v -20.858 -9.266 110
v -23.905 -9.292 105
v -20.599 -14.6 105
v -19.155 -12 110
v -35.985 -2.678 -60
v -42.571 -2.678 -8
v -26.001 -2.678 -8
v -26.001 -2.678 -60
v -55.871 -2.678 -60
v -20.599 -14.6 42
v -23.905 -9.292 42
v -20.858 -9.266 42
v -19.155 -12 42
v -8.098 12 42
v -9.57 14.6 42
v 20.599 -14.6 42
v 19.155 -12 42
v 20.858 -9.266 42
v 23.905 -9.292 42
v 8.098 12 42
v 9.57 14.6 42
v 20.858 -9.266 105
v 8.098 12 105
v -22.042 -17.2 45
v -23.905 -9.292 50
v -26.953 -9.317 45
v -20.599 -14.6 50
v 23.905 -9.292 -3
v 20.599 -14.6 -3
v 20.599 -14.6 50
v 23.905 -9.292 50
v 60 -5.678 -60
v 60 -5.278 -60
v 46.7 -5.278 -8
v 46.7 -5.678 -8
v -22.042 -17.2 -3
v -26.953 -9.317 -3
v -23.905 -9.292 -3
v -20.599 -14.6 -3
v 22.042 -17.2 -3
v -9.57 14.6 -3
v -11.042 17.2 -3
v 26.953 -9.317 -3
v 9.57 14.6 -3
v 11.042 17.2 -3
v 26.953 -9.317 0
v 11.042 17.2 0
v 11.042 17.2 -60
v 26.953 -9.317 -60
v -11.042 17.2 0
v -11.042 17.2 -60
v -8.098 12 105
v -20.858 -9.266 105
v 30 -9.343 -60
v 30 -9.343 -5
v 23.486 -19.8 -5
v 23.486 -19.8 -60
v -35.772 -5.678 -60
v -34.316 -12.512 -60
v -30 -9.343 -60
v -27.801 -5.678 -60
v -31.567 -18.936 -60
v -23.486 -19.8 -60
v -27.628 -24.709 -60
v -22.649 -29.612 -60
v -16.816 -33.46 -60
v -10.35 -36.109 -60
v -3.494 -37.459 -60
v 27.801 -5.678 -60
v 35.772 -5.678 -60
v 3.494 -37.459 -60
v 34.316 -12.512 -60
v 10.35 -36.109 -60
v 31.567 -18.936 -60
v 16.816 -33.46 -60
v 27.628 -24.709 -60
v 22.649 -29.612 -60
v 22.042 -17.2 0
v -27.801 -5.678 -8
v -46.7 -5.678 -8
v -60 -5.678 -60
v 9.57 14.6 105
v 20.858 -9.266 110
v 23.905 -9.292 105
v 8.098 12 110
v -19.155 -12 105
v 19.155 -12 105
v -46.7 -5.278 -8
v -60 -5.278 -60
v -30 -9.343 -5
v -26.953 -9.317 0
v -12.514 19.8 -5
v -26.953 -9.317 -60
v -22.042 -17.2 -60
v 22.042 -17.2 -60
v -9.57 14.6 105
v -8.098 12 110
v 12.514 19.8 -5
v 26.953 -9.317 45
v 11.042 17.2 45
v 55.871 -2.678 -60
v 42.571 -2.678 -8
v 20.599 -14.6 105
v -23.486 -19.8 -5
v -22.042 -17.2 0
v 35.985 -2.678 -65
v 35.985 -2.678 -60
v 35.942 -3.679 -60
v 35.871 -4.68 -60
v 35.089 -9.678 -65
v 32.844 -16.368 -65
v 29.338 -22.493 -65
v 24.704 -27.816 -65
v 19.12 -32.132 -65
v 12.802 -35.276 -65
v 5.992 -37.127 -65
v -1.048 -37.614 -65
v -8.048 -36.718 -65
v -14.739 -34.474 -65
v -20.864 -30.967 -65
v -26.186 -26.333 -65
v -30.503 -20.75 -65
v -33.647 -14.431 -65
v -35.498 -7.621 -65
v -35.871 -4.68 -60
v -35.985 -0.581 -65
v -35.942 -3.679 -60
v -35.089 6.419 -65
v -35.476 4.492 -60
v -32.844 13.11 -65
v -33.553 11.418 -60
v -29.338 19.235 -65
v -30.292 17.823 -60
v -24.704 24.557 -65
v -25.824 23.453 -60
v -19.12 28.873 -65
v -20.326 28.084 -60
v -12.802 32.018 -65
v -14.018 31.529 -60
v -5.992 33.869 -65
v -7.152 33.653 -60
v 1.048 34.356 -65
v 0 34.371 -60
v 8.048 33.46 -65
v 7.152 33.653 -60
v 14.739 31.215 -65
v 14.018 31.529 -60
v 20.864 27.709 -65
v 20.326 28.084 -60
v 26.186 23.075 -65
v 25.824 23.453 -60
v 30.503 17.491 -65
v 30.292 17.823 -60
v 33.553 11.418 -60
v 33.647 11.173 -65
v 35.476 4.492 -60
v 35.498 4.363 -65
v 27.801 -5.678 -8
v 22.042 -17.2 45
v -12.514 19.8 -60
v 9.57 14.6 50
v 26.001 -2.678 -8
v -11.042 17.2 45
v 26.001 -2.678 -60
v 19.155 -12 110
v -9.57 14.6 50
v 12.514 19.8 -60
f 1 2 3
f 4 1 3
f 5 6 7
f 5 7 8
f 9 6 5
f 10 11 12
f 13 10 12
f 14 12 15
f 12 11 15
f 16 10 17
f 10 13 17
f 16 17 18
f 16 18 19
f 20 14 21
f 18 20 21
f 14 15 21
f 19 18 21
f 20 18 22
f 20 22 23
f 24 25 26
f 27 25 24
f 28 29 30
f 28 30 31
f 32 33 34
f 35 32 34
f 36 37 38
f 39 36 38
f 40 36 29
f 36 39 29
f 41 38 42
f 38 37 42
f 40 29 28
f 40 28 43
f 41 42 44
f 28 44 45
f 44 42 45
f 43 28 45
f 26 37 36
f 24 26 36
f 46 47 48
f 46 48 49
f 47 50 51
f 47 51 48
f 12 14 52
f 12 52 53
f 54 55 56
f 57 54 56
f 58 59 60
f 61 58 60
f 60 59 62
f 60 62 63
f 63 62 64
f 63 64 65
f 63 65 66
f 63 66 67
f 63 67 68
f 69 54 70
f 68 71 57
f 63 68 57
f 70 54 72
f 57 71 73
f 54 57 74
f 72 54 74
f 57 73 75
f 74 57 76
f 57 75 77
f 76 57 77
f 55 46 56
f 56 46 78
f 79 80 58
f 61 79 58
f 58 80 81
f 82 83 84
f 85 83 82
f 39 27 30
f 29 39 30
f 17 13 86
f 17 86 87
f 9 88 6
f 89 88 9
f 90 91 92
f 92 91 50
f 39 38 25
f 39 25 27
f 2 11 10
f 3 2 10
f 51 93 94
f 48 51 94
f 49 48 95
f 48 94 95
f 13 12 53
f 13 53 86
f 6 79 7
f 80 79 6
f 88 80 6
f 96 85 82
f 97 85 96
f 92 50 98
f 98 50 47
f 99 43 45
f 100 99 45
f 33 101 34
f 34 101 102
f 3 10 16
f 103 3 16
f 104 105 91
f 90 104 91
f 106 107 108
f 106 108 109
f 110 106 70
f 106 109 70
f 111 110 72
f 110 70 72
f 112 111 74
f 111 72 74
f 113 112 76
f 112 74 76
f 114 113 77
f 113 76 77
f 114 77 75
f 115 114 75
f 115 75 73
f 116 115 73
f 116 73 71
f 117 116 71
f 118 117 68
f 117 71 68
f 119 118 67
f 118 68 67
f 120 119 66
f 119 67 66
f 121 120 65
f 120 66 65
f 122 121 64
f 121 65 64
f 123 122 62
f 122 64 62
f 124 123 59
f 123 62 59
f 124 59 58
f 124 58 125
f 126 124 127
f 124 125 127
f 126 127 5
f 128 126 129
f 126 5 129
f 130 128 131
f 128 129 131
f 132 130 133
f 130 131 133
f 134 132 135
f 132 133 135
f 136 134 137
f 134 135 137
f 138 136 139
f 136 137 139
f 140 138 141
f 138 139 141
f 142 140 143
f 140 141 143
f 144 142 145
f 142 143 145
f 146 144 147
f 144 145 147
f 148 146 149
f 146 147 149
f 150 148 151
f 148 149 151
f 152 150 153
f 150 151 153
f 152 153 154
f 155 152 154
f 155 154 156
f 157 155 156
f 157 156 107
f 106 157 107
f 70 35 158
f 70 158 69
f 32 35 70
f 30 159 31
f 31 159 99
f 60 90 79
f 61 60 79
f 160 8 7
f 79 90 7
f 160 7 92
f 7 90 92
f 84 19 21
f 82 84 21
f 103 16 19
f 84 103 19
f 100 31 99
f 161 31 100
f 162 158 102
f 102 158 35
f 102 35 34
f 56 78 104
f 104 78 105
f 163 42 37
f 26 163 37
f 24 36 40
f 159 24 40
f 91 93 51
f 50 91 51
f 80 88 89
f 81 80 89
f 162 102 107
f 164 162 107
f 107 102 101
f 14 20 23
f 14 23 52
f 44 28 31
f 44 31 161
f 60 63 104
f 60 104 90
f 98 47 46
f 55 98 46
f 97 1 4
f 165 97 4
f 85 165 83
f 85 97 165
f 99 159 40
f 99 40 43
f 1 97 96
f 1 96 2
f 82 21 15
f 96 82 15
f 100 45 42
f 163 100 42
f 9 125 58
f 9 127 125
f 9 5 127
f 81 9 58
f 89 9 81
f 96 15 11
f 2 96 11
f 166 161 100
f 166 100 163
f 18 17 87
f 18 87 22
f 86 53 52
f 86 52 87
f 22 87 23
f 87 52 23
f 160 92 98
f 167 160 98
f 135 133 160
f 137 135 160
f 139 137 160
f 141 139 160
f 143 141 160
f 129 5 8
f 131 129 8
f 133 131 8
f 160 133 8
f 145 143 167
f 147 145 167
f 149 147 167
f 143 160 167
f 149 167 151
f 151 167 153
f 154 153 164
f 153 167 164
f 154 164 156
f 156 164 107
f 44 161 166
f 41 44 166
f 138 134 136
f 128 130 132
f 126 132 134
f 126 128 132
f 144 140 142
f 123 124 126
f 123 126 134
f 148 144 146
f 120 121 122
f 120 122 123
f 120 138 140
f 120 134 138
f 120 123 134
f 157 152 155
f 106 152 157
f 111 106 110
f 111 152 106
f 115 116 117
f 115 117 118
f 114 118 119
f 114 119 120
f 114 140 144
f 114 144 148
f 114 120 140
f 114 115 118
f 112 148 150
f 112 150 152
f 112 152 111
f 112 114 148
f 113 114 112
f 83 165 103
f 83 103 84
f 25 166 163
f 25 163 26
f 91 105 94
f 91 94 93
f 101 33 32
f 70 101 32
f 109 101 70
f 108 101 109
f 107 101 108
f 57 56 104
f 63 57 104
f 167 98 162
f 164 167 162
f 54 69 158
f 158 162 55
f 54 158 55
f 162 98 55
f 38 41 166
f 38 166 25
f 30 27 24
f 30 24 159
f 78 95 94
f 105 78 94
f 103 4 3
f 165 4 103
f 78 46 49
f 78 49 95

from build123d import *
from OCP.BRepFilletAPI import BRepFilletAPI_MakeChamfer

# Parameters (mm, degrees)
BOSS_EXTRUDE1_DEPTH      = 60
BOSS_EXTRUDE2_DEPTH      = 50
BOSS_EXTRUDE2_DEPTH_BACK = 3
CHAMFER1_SIZE            = 5
CHAMFER1_SIZE_2          = 2.6
BOSS_EXTRUDE3_DEPTH      = 60
BOSS_EXTRUDE3_DEPTH_BACK = 8
CHAMFER2_SIZE            = 2.6
CHAMFER2_SIZE_2          = 5
BOSS_EXTRUDE4_REACH      = 145.499
SKETCH9_W                = 52
SKETCH9_H                = 3
CUT_EXTRUDE1_DEPTH       = 28
CHAMFER3_SIZE            = 2.6
CHAMFER3_SIZE_2          = 5
BOSS_EXTRUDE5_DEPTH      = 5
BOSS_EXTRUDE6_REACH      = 165.988
SKETCH13_W               = 52
SKETCH13_H               = 3
CUT_EXTRUDE2_DEPTH       = 5
CHAMFER4_SIZE            = 4
CHAMFER4_SIZE2           = 2.6
CHAMFER5_SIZE            = 2.6
CHAMFER5_SIZE2           = 4
SKETCH16_R               = 36
BOSS_EXTRUDE7_DEPTH      = 5


with BuildPart() as part:
    # Sketch1 → Boss-Extrude1 (new body)
    with BuildSketch(Plane.XY):
        Polygon((23.485714286, -19.8), (-23.485714286, -19.8), (-30, -9.342857143), (-12.514285714, 19.8), (12.514285714, 19.8), (30, -9.342857143), align=None)
        Polygon((-26.95263288, -9.317403585), (-11.042190729, 17.2), (11.042190729, 17.2), (26.95263288, -9.317403585), (22.042162982, -17.2), (-22.042162982, -17.2), align=None, mode=Mode.SUBTRACT)
    extrude(amount=-BOSS_EXTRUDE1_DEPTH)

    # Chamfer1
    chamfer1_edges_1 = [part.edges().sort_by_distance(p)[0] for p in [
        (26.742857143, -14.571428571, 0),
    ]]
    chamfer1_side_1 = [part.faces().sort_by_distance(p)[0] for p in [
        (26.742857143, -14.571428571, -0.052),
    ]]
    chamfer1_edges_2 = [part.edges().sort_by_distance(p)[0] for p in [
        (0, -19.8, 0),
    ]]
    chamfer1_side_2 = [part.faces().sort_by_distance(p)[0] for p in [
        (0, -19.8, -0.052),
    ]]
    chamfer1_edges_3 = [part.edges().sort_by_distance(p)[0] for p in [
        (-26.742857143, -14.571428571, 0),
    ]]
    chamfer1_side_3 = [part.faces().sort_by_distance(p)[0] for p in [
        (-26.742857143, -14.571428571, -0.052),
    ]]
    chamfer1_edges_4 = [part.edges().sort_by_distance(p)[0] for p in [
        (-21.257142857, 5.228571429, 0),
    ]]
    chamfer1_side_4 = [part.faces().sort_by_distance(p)[0] for p in [
        (-21.257142857, 5.228571429, -0.052),
    ]]
    chamfer1_edges_5 = [part.edges().sort_by_distance(p)[0] for p in [
        (0, 19.8, 0),
    ]]
    chamfer1_side_5 = [part.faces().sort_by_distance(p)[0] for p in [
        (0, 19.8, -0.052),
    ]]
    chamfer1_edges_6 = [part.edges().sort_by_distance(p)[0] for p in [
        (21.257142857, 5.228571429, 0),
    ]]
    chamfer1_side_6 = [part.faces().sort_by_distance(p)[0] for p in [
        (21.257142857, 5.228571429, -0.052),
    ]]
    chamfer1 = BRepFilletAPI_MakeChamfer(part.part.solid().wrapped)
    for e in chamfer1_edges_1:
        chamfer1.Add(CHAMFER1_SIZE - 0.0001, CHAMFER1_SIZE_2 - 0.0001, e.wrapped, chamfer1_side_1[0].wrapped)
    for e in chamfer1_edges_2:
        chamfer1.Add(CHAMFER1_SIZE - 0.0001, CHAMFER1_SIZE_2 - 0.0001, e.wrapped, chamfer1_side_2[0].wrapped)
    for e in chamfer1_edges_3:
        chamfer1.Add(CHAMFER1_SIZE - 0.0001, CHAMFER1_SIZE_2 - 0.0001, e.wrapped, chamfer1_side_3[0].wrapped)
    for e in chamfer1_edges_4:
        chamfer1.Add(CHAMFER1_SIZE - 0.0001, CHAMFER1_SIZE_2 - 0.0001, e.wrapped, chamfer1_side_4[0].wrapped)
    for e in chamfer1_edges_5:
        chamfer1.Add(CHAMFER1_SIZE - 0.0001, CHAMFER1_SIZE_2 - 0.0001, e.wrapped, chamfer1_side_5[0].wrapped)
    for e in chamfer1_edges_6:
        chamfer1.Add(CHAMFER1_SIZE - 0.0001, CHAMFER1_SIZE_2 - 0.0001, e.wrapped, chamfer1_side_6[0].wrapped)
    add(Compound.cast(chamfer1.Shape()), mode=Mode.REPLACE)  # a hair under: the kernel refuses the full size

    # Boss-Extrude4: up to this plane
    boss_extrude4_end = Plane(origin=(12.514285714, 19.8, -60), z_dir=(0.8574929257125442, 0.5144957554275265, 0))
    # Sketch9 → Boss-Extrude4 (add, up to the surface)
    with BuildSketch(Plane(origin=(60, 0, 0), x_dir=(0, 0, -1), z_dir=(1, 0, 0)), mode=Mode.PRIVATE) as boss_extrude4_sk1:
        with Locations((34, -4.177515253)):
            Rectangle(SKETCH9_W, SKETCH9_H)
    boss_extrude4_tool1 = split(extrude(boss_extrude4_sk1.sketch, amount=-BOSS_EXTRUDE4_REACH, mode=Mode.PRIVATE), bisect_by=boss_extrude4_end, keep=Keep.BOTH, mode=Mode.PRIVATE)
    add(boss_extrude4_tool1.solids().sort_by_distance((60, -4.177515, -34))[0])

    # Sketch10 → Cut-Extrude1 (cut)
    with BuildSketch(Plane(origin=(0, -2.677515253, 0), x_dir=(1, 0, 0), z_dir=(0, 1, 0))):
        Polygon((60, 8), (60, 60), (46.7, 8), align=None)
    extrude(amount=-CUT_EXTRUDE1_DEPTH, mode=Mode.SUBTRACT)

    # Boss-Extrude6: up to this plane
    boss_extrude6_end = Plane(origin=(-30, -9.342857143, -60), z_dir=(-0.8574929257125442, 0.5144957554275265, 0))
    # Sketch13 → Boss-Extrude6 (add, up to the surface)
    with BuildSketch(Plane(origin=(-60, 0, 0), x_dir=(0, 0, -1), z_dir=(1, 0, 0)), mode=Mode.PRIVATE) as boss_extrude6_sk1:
        with Locations((34, -4.177515253)):
            Rectangle(SKETCH13_W, SKETCH13_H)
    boss_extrude6_tool1 = split(extrude(boss_extrude6_sk1.sketch, amount=BOSS_EXTRUDE6_REACH, mode=Mode.PRIVATE), bisect_by=boss_extrude6_end, keep=Keep.BOTH, mode=Mode.PRIVATE)
    add(boss_extrude6_tool1.solids().sort_by_distance((-60, -4.177515, -34))[0])

    # Sketch14 → Cut-Extrude2 (cut)
    with BuildSketch(Plane(origin=(0, -2.677515253, 0), x_dir=(1, 0, 0), z_dir=(0, 1, 0))):
        Polygon((-60, 60), (-60, 8), (-46.7, 8), align=None)
    extrude(amount=-CUT_EXTRUDE2_DEPTH, mode=Mode.SUBTRACT)

    # Chamfer4
    chamfer4_edges = [part.edges().sort_by_distance(p)[0] for p in [
        (-53.35, -2.677515253, -34),
    ]]
    chamfer4_side = [part.faces().sort_by_distance(p)[0] for p in [
        (-39.944890335, -2.677515253, -36.10731292),
    ]]
    chamfer(chamfer4_edges, length=CHAMFER4_SIZE, length2=CHAMFER4_SIZE2, reference=chamfer4_side[0])

    # Chamfer5
    chamfer5_edges = [part.edges().sort_by_distance(p)[0] for p in [
        (53.35, -2.677515253, -34),
    ]]
    chamfer5_side = [part.faces().sort_by_distance(p)[0] for p in [
        (53.35, -4.177515253, -34),
    ]]
    chamfer(chamfer5_edges, length=CHAMFER5_SIZE, length2=CHAMFER5_SIZE2, reference=chamfer5_side[0])

    # Sketch16 → Boss-Extrude7 (add)
    with BuildSketch(Plane(origin=(0, 0, -60), x_dir=(-1, 0, 0), z_dir=(0, 0, -1))):
        with Locations(Location((0, -1.629183352, 0), (0, 0, 181.66870794))):
            Circle(SKETCH16_R)
    extrude(amount=BOSS_EXTRUDE7_DEPTH)


with BuildPart() as body_2:
    # Sketch2 → Boss-Extrude2 (new, two sides: drawn at the far end of the back side and taken through both)
    with BuildSketch(Plane.XY.offset(-BOSS_EXTRUDE2_DEPTH_BACK)):
        Polygon((26.95263288, -9.317403585), (11.042190729, 17.2), (-11.042190729, 17.2), (-26.95263288, -9.317403585), (-22.042162982, -17.2), (22.042162982, -17.2), align=None)
        Polygon((23.90526576, -9.291950027), (9.570095744, 14.6), (-9.570095744, 14.6), (-23.90526576, -9.291950027), (-20.598611678, -14.6), (20.598611678, -14.6), align=None, mode=Mode.SUBTRACT)
    extrude(amount=BOSS_EXTRUDE2_DEPTH + BOSS_EXTRUDE2_DEPTH_BACK)

    # Chamfer2
    chamfer2_edges_1 = [body_2.edges().sort_by_distance(p)[0] for p in [
        (24.497397931, -13.258701792, 50),
    ]]
    chamfer2_side_1 = [body_2.faces().sort_by_distance(p)[0] for p in [
        (24.453261418, -13.231206916, 50),
    ]]
    chamfer2_edges_2 = [body_2.edges().sort_by_distance(p)[0] for p in [
        (18.997411804, 3.941298208, 50),
    ]]
    chamfer2_side_2 = [body_2.faces().sort_by_distance(p)[0] for p in [
        (18.997411804, 3.941298208, 49.948),
    ]]
    chamfer2_edges_3 = [body_2.edges().sort_by_distance(p)[0] for p in [
        (0, 17.2, 50),
    ]]
    chamfer2_side_3 = [body_2.faces().sort_by_distance(p)[0] for p in [
        (0, 17.2, 49.948),
    ]]
    chamfer2_edges_4 = [body_2.edges().sort_by_distance(p)[0] for p in [
        (-18.997411804, 3.941298208, 50),
    ]]
    chamfer2_side_4 = [body_2.faces().sort_by_distance(p)[0] for p in [
        (-18.997411804, 3.941298208, 49.948),
    ]]
    chamfer2_edges_5 = [body_2.edges().sort_by_distance(p)[0] for p in [
        (-24.497397931, -13.258701792, 50),
    ]]
    chamfer2_side_5 = [body_2.faces().sort_by_distance(p)[0] for p in [
        (-24.497397931, -13.258701792, 49.948),
    ]]
    chamfer2_edges_6 = [body_2.edges().sort_by_distance(p)[0] for p in [
        (0, -17.2, 50),
    ]]
    chamfer2_side_6 = [body_2.faces().sort_by_distance(p)[0] for p in [
        (0, -17.2, 49.948),
    ]]
    chamfer2 = BRepFilletAPI_MakeChamfer(body_2.part.solid().wrapped)
    for e in chamfer2_edges_1:
        chamfer2.Add(CHAMFER2_SIZE - 0.0001, CHAMFER2_SIZE_2 - 0.0001, e.wrapped, chamfer2_side_1[0].wrapped)
    for e in chamfer2_edges_2:
        chamfer2.Add(CHAMFER2_SIZE_2 - 0.0001, CHAMFER2_SIZE - 0.0001, e.wrapped, chamfer2_side_2[0].wrapped)
    for e in chamfer2_edges_3:
        chamfer2.Add(CHAMFER2_SIZE_2 - 0.0001, CHAMFER2_SIZE - 0.0001, e.wrapped, chamfer2_side_3[0].wrapped)
    for e in chamfer2_edges_4:
        chamfer2.Add(CHAMFER2_SIZE_2 - 0.0001, CHAMFER2_SIZE - 0.0001, e.wrapped, chamfer2_side_4[0].wrapped)
    for e in chamfer2_edges_5:
        chamfer2.Add(CHAMFER2_SIZE_2 - 0.0001, CHAMFER2_SIZE - 0.0001, e.wrapped, chamfer2_side_5[0].wrapped)
    for e in chamfer2_edges_6:
        chamfer2.Add(CHAMFER2_SIZE_2 - 0.0001, CHAMFER2_SIZE - 0.0001, e.wrapped, chamfer2_side_6[0].wrapped)
    add(Compound.cast(chamfer2.Shape()), mode=Mode.REPLACE)  # a hair under: the kernel refuses the full size


with BuildPart() as body_3:
    # Sketch8 → Boss-Extrude3 (new, two sides: drawn at the far end of the back side and taken through both)
    with BuildSketch(Plane.XY.offset(50).offset(-BOSS_EXTRUDE3_DEPTH_BACK)):
        Polygon((23.90526576, -9.291950027), (9.570095744, 14.6), (-9.570095744, 14.6), (-23.90526576, -9.291950027), (-20.598611678, -14.6), (20.598611678, -14.6), align=None)
        Polygon((19.155060374, -12), (20.85789864, -9.266496469), (8.098000758, 12), (-8.098000758, 12), (-20.85789864, -9.266496469), (-19.155060374, -12), align=None, mode=Mode.SUBTRACT)
    extrude(amount=BOSS_EXTRUDE3_DEPTH + BOSS_EXTRUDE3_DEPTH_BACK)

    # Chamfer3
    chamfer3_edges_1 = [body_3.edges().sort_by_distance(p)[0] for p in [
        (22.251938719, -11.945975013, 110),
    ]]
    chamfer3_side_1 = [body_3.faces().sort_by_distance(p)[0] for p in [
        (22.207802206, -11.918480137, 110),
    ]]
    chamfer3_edges_2 = [body_3.edges().sort_by_distance(p)[0] for p in [
        (16.737680752, 2.654024987, 110),
    ]]
    chamfer3_side_2 = [body_3.faces().sort_by_distance(p)[0] for p in [
        (16.737680752, 2.654024987, 109.948),
    ]]
    chamfer3_edges_3 = [body_3.edges().sort_by_distance(p)[0] for p in [
        (0, 14.6, 110),
    ]]
    chamfer3_side_3 = [body_3.faces().sort_by_distance(p)[0] for p in [
        (0, 14.6, 109.948),
    ]]
    chamfer3_edges_4 = [body_3.edges().sort_by_distance(p)[0] for p in [
        (-16.737680752, 2.654024987, 110),
    ]]
    chamfer3_side_4 = [body_3.faces().sort_by_distance(p)[0] for p in [
        (-16.737680752, 2.654024987, 109.948),
    ]]
    chamfer3_edges_5 = [body_3.edges().sort_by_distance(p)[0] for p in [
        (-22.251938719, -11.945975013, 110),
    ]]
    chamfer3_side_5 = [body_3.faces().sort_by_distance(p)[0] for p in [
        (-22.251938719, -11.945975013, 109.948),
    ]]
    chamfer3_edges_6 = [body_3.edges().sort_by_distance(p)[0] for p in [
        (0, -14.6, 110),
    ]]
    chamfer3_side_6 = [body_3.faces().sort_by_distance(p)[0] for p in [
        (0, -14.6, 109.948),
    ]]
    chamfer3 = BRepFilletAPI_MakeChamfer(body_3.part.solid().wrapped)
    for e in chamfer3_edges_1:
        chamfer3.Add(CHAMFER3_SIZE - 0.0001, CHAMFER3_SIZE_2 - 0.0001, e.wrapped, chamfer3_side_1[0].wrapped)
    for e in chamfer3_edges_2:
        chamfer3.Add(CHAMFER3_SIZE_2 - 0.0001, CHAMFER3_SIZE - 0.0001, e.wrapped, chamfer3_side_2[0].wrapped)
    for e in chamfer3_edges_3:
        chamfer3.Add(CHAMFER3_SIZE_2 - 0.0001, CHAMFER3_SIZE - 0.0001, e.wrapped, chamfer3_side_3[0].wrapped)
    for e in chamfer3_edges_4:
        chamfer3.Add(CHAMFER3_SIZE_2 - 0.0001, CHAMFER3_SIZE - 0.0001, e.wrapped, chamfer3_side_4[0].wrapped)
    for e in chamfer3_edges_5:
        chamfer3.Add(CHAMFER3_SIZE_2 - 0.0001, CHAMFER3_SIZE - 0.0001, e.wrapped, chamfer3_side_5[0].wrapped)
    for e in chamfer3_edges_6:
        chamfer3.Add(CHAMFER3_SIZE_2 - 0.0001, CHAMFER3_SIZE - 0.0001, e.wrapped, chamfer3_side_6[0].wrapped)
    add(Compound.cast(chamfer3.Shape()), mode=Mode.REPLACE)  # a hair under: the kernel refuses the full size

    # Sketch12 → Boss-Extrude5 (add)
    with BuildSketch(Plane.XY.offset(110)):
        Polygon((-20.85789864, -9.266496469), (-19.155060374, -12), (19.155060374, -12), (20.85789864, -9.266496469), (8.098000758, 12), (-8.098000758, 12), align=None)
    extrude(amount=-BOSS_EXTRUDE5_DEPTH)


solid = Compound([part.part, body_2.part, body_3.part])
